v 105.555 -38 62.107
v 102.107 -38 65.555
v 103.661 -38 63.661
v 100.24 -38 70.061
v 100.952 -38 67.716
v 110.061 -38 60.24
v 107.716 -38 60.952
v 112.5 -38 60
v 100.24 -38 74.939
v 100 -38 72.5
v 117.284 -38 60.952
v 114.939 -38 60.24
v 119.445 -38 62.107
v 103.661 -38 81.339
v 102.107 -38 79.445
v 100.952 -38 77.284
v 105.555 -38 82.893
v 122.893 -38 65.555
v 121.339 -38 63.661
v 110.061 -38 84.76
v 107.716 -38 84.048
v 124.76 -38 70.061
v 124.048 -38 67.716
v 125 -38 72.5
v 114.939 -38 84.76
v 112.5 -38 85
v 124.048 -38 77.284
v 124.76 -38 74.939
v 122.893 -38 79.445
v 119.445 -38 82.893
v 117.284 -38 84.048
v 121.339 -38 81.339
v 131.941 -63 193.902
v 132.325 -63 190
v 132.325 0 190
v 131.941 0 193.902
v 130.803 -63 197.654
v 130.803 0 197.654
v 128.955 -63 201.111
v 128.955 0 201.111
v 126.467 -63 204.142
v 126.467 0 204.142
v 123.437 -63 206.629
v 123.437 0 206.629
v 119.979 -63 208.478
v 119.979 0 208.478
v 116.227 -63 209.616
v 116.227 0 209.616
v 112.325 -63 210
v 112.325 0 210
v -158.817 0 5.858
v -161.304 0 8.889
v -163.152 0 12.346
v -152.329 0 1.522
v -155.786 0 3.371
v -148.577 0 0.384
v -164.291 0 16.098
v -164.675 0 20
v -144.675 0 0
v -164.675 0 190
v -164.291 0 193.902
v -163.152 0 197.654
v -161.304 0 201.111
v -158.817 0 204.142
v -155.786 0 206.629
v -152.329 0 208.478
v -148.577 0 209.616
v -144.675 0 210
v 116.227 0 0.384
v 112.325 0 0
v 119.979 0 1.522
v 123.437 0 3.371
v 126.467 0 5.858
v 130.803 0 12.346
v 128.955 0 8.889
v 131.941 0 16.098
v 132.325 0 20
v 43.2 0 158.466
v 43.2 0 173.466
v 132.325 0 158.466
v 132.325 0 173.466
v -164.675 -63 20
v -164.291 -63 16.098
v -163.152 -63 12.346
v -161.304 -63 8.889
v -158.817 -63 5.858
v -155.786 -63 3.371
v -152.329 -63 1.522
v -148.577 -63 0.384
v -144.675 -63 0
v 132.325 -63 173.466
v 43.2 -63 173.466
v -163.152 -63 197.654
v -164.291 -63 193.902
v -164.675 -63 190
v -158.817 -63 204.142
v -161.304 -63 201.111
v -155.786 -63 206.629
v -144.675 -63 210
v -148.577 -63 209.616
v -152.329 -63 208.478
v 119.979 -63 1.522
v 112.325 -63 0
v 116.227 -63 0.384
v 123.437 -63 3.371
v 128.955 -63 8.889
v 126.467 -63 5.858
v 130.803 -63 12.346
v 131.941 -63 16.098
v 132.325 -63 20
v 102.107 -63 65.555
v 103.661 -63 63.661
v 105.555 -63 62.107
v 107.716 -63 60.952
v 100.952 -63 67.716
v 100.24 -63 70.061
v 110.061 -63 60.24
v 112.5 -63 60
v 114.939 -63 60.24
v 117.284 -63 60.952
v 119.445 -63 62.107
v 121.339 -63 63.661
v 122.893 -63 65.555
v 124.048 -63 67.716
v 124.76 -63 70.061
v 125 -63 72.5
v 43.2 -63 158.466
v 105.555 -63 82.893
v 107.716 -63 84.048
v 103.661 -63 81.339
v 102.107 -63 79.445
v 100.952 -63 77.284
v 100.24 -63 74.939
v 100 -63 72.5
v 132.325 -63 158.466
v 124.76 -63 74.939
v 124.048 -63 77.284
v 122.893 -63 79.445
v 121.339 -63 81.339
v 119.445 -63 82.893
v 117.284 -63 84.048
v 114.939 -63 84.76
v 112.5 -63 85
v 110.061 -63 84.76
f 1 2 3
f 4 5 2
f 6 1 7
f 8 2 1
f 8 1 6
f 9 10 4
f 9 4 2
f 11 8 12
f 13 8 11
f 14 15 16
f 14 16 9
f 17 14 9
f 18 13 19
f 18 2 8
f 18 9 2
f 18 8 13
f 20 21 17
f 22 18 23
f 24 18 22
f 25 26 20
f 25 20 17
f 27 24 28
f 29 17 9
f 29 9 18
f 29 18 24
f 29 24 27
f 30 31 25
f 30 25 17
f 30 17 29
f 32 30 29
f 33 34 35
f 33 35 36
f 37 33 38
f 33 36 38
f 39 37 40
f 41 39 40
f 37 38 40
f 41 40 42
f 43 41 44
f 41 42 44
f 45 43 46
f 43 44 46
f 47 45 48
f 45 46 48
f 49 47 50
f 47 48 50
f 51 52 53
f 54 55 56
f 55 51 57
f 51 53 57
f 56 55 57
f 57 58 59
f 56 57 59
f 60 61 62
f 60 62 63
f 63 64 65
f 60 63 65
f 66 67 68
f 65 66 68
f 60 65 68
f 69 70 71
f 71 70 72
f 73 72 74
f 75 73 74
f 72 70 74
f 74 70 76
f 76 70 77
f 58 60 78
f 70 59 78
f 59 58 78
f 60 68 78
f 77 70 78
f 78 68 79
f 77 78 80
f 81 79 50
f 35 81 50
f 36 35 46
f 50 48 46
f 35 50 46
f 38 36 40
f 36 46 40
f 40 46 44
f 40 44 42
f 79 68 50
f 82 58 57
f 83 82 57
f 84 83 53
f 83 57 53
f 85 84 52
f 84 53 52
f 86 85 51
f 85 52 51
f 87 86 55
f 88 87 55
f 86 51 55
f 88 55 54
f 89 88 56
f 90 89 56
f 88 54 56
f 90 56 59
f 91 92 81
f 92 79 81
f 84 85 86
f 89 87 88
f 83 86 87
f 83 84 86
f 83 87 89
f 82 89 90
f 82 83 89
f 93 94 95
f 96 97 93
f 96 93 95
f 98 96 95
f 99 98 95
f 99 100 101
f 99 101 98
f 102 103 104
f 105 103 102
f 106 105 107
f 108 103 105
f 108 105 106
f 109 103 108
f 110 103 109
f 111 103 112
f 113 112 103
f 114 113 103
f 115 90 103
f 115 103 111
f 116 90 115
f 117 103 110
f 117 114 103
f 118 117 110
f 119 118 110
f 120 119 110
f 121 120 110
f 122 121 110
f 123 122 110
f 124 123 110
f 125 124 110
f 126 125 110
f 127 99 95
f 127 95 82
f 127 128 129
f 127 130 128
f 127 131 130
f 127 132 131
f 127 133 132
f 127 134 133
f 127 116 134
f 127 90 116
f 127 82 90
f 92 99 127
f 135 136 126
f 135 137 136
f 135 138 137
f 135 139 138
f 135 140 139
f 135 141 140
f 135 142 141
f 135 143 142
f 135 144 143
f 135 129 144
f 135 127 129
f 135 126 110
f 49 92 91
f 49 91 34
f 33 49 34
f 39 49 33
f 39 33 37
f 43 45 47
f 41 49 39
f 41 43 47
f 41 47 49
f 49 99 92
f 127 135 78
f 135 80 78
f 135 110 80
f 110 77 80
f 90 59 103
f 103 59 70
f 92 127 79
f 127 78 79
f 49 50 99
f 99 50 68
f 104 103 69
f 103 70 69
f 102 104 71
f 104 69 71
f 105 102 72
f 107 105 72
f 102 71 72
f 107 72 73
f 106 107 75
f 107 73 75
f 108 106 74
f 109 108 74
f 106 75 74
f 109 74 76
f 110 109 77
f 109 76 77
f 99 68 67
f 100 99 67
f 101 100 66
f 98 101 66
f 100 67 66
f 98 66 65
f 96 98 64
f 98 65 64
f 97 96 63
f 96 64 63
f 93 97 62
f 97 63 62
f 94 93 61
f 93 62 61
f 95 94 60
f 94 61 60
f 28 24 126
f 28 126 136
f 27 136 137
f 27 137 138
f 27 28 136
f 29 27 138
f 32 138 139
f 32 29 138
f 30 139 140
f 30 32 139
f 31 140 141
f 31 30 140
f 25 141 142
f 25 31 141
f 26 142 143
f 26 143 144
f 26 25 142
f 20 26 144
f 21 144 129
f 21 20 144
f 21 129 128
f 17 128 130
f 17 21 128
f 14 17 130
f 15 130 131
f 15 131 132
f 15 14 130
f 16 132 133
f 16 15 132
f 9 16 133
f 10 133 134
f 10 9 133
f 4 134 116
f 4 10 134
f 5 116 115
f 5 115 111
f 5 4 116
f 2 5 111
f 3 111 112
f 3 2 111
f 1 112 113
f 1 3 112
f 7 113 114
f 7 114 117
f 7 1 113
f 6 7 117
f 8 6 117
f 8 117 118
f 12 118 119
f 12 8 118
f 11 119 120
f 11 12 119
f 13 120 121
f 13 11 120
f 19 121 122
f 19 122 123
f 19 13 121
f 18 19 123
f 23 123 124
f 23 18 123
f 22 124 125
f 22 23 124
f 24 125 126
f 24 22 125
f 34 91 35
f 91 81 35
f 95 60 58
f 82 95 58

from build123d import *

# Parameters (mm, degrees)
F1_DEPTH = 13
F2_DEPTH = 25
F3_W     = 110
F3_H     = 15
F4_DEPTH = 25
F5_DEPTH = 25
F6_R     = 12.5
F7_DEPTH = 25


with BuildPart() as f1:
    # F0 (on Front) → F1 (new body)
    with BuildSketch(Plane.XZ):
        with BuildLine():
            Line((112.3251678944, 210), (-144.6748321056, 210))
            ThreePointArc((-144.6748321056, 210), (-158.8169677293, 204.1421356237), (-164.6748321056, 190))
            Line((-164.6748321056, 190), (-164.6748321056, 20))
            ThreePointArc((-164.6748321056, 20), (-158.8169677293, 5.8578643763), (-144.6748321056, 0))
            Line((-144.6748321056, 0), (112.3251678944, 0))
            ThreePointArc((112.3251678944, 0), (126.4673035181, 5.8578643763), (132.3251678944, 20))
            Line((132.3251678944, 20), (132.3251678944, 190))
            ThreePointArc((132.3251678944, 190), (126.4673035181, 204.1421356237), (112.3251678944, 210))
        make_face()
    extrude(amount=F1_DEPTH)

    # F0 (on Front) + F1_face (on face) → F2 (join)
    with BuildSketch(Plane.XZ):
        with BuildLine():
            Line((112.3251678944, 210), (-144.6748321056, 210))
            ThreePointArc((-144.6748321056, 210), (-158.8169677293, 204.1421356237), (-164.6748321056, 190))
            Line((-164.6748321056, 190), (-164.6748321056, 20))
            ThreePointArc((-164.6748321056, 20), (-158.8169677293, 5.8578643763), (-144.6748321056, 0))
            Line((-144.6748321056, 0), (112.3251678944, 0))
            ThreePointArc((112.3251678944, 0), (126.4673035181, 5.8578643763), (132.3251678944, 20))
            Line((132.3251678944, 20), (132.3251678944, 190))
            ThreePointArc((132.3251678944, 190), (126.4673035181, 204.1421356237), (112.3251678944, 210))
        make_face()
    with BuildSketch(Plane(origin=(-16.1748321056, -13, 105), x_dir=(1, 0, 0), z_dir=(0, -1, 0))):
        with BuildLine():
            Line((148.5, -85), (148.5, 85))
            ThreePointArc((148.5, 85), (142.6421356237, 99.1421356237), (128.5, 105))
            Line((128.5, 105), (-128.5, 105))
            ThreePointArc((-128.5, 105), (-142.6421356237, 99.1421356237), (-148.5, 85))
            Line((-148.5, 85), (-148.5, -85))
            ThreePointArc((-148.5, -85), (-142.6421356237, -99.1421356237), (-128.5, -105))
            Line((-128.5, -105), (128.5, -105))
            ThreePointArc((128.5, -105), (142.6421356237, -99.1421356237), (148.5, -85))
        make_face()
    extrude(amount=F2_DEPTH)

    # F3 (on face) → F4 (cut)
    with BuildSketch(Plane.XZ.offset(38)):
        with Locations((98.1996059418, 165.9660535473)):
            Rectangle(F3_W, F3_H)
    extrude(amount=-F4_DEPTH, mode=Mode.SUBTRACT)

    # F5 (cut): a face of the model
    f5_faces = [f1.faces().sort_by_distance(p)[0] for p in [
        (87.7623869181, -13, 165.9660535473),
    ]]
    extrude(f5_faces, amount=-F5_DEPTH, mode=Mode.SUBTRACT)

    # F6 (on face) → F7 (join)
    with BuildSketch(Plane.XZ.offset(38)):
        with BuildLine():
            ThreePointArc((-164.6748321056, 20), (-158.8169677293, 5.8578643763), (-144.6748321056, 0))
            Line((-144.6748321056, 0), (112.3251678944, 0))
            ThreePointArc((112.3251678944, 0), (126.4673035181, 5.8578643763), (132.3251678944, 20))
            Line((132.3251678944, 20), (132.3251678944, 158.4660535473))
            Line((132.3251678944, 158.4660535473), (43.1996059418, 158.4660535473))
            Line((43.1996059418, 158.4660535473), (43.1996059418, 173.4660535473))
            Line((43.1996059418, 173.4660535473), (132.3251678944, 173.4660535473))
            Line((132.3251678944, 173.4660535473), (132.3251678944, 190))
            ThreePointArc((132.3251678944, 190), (126.4673035181, 204.1421356237), (112.3251678944, 210))
            Line((112.3251678944, 210), (-144.6748321056, 210))
            ThreePointArc((-144.6748321056, 210), (-158.8169677293, 204.1421356237), (-164.6748321056, 190))
            Line((-164.6748321056, 190), (-164.6748321056, 20))
        make_face()
        with Locations((2.5, 72.5)):
            Circle(F6_R, mode=Mode.SUBTRACT)
        with Locations((57.5, 72.5)):
            Circle(F6_R, mode=Mode.SUBTRACT)
        with Locations((112.5, 72.5)):
            Circle(F6_R, mode=Mode.SUBTRACT)
        with Locations((2.5, 72.5)):
            Circle(F6_R)
        with Locations((57.5, 72.5)):
            Circle(F6_R)
    extrude(amount=F7_DEPTH)


solid = f1.part
